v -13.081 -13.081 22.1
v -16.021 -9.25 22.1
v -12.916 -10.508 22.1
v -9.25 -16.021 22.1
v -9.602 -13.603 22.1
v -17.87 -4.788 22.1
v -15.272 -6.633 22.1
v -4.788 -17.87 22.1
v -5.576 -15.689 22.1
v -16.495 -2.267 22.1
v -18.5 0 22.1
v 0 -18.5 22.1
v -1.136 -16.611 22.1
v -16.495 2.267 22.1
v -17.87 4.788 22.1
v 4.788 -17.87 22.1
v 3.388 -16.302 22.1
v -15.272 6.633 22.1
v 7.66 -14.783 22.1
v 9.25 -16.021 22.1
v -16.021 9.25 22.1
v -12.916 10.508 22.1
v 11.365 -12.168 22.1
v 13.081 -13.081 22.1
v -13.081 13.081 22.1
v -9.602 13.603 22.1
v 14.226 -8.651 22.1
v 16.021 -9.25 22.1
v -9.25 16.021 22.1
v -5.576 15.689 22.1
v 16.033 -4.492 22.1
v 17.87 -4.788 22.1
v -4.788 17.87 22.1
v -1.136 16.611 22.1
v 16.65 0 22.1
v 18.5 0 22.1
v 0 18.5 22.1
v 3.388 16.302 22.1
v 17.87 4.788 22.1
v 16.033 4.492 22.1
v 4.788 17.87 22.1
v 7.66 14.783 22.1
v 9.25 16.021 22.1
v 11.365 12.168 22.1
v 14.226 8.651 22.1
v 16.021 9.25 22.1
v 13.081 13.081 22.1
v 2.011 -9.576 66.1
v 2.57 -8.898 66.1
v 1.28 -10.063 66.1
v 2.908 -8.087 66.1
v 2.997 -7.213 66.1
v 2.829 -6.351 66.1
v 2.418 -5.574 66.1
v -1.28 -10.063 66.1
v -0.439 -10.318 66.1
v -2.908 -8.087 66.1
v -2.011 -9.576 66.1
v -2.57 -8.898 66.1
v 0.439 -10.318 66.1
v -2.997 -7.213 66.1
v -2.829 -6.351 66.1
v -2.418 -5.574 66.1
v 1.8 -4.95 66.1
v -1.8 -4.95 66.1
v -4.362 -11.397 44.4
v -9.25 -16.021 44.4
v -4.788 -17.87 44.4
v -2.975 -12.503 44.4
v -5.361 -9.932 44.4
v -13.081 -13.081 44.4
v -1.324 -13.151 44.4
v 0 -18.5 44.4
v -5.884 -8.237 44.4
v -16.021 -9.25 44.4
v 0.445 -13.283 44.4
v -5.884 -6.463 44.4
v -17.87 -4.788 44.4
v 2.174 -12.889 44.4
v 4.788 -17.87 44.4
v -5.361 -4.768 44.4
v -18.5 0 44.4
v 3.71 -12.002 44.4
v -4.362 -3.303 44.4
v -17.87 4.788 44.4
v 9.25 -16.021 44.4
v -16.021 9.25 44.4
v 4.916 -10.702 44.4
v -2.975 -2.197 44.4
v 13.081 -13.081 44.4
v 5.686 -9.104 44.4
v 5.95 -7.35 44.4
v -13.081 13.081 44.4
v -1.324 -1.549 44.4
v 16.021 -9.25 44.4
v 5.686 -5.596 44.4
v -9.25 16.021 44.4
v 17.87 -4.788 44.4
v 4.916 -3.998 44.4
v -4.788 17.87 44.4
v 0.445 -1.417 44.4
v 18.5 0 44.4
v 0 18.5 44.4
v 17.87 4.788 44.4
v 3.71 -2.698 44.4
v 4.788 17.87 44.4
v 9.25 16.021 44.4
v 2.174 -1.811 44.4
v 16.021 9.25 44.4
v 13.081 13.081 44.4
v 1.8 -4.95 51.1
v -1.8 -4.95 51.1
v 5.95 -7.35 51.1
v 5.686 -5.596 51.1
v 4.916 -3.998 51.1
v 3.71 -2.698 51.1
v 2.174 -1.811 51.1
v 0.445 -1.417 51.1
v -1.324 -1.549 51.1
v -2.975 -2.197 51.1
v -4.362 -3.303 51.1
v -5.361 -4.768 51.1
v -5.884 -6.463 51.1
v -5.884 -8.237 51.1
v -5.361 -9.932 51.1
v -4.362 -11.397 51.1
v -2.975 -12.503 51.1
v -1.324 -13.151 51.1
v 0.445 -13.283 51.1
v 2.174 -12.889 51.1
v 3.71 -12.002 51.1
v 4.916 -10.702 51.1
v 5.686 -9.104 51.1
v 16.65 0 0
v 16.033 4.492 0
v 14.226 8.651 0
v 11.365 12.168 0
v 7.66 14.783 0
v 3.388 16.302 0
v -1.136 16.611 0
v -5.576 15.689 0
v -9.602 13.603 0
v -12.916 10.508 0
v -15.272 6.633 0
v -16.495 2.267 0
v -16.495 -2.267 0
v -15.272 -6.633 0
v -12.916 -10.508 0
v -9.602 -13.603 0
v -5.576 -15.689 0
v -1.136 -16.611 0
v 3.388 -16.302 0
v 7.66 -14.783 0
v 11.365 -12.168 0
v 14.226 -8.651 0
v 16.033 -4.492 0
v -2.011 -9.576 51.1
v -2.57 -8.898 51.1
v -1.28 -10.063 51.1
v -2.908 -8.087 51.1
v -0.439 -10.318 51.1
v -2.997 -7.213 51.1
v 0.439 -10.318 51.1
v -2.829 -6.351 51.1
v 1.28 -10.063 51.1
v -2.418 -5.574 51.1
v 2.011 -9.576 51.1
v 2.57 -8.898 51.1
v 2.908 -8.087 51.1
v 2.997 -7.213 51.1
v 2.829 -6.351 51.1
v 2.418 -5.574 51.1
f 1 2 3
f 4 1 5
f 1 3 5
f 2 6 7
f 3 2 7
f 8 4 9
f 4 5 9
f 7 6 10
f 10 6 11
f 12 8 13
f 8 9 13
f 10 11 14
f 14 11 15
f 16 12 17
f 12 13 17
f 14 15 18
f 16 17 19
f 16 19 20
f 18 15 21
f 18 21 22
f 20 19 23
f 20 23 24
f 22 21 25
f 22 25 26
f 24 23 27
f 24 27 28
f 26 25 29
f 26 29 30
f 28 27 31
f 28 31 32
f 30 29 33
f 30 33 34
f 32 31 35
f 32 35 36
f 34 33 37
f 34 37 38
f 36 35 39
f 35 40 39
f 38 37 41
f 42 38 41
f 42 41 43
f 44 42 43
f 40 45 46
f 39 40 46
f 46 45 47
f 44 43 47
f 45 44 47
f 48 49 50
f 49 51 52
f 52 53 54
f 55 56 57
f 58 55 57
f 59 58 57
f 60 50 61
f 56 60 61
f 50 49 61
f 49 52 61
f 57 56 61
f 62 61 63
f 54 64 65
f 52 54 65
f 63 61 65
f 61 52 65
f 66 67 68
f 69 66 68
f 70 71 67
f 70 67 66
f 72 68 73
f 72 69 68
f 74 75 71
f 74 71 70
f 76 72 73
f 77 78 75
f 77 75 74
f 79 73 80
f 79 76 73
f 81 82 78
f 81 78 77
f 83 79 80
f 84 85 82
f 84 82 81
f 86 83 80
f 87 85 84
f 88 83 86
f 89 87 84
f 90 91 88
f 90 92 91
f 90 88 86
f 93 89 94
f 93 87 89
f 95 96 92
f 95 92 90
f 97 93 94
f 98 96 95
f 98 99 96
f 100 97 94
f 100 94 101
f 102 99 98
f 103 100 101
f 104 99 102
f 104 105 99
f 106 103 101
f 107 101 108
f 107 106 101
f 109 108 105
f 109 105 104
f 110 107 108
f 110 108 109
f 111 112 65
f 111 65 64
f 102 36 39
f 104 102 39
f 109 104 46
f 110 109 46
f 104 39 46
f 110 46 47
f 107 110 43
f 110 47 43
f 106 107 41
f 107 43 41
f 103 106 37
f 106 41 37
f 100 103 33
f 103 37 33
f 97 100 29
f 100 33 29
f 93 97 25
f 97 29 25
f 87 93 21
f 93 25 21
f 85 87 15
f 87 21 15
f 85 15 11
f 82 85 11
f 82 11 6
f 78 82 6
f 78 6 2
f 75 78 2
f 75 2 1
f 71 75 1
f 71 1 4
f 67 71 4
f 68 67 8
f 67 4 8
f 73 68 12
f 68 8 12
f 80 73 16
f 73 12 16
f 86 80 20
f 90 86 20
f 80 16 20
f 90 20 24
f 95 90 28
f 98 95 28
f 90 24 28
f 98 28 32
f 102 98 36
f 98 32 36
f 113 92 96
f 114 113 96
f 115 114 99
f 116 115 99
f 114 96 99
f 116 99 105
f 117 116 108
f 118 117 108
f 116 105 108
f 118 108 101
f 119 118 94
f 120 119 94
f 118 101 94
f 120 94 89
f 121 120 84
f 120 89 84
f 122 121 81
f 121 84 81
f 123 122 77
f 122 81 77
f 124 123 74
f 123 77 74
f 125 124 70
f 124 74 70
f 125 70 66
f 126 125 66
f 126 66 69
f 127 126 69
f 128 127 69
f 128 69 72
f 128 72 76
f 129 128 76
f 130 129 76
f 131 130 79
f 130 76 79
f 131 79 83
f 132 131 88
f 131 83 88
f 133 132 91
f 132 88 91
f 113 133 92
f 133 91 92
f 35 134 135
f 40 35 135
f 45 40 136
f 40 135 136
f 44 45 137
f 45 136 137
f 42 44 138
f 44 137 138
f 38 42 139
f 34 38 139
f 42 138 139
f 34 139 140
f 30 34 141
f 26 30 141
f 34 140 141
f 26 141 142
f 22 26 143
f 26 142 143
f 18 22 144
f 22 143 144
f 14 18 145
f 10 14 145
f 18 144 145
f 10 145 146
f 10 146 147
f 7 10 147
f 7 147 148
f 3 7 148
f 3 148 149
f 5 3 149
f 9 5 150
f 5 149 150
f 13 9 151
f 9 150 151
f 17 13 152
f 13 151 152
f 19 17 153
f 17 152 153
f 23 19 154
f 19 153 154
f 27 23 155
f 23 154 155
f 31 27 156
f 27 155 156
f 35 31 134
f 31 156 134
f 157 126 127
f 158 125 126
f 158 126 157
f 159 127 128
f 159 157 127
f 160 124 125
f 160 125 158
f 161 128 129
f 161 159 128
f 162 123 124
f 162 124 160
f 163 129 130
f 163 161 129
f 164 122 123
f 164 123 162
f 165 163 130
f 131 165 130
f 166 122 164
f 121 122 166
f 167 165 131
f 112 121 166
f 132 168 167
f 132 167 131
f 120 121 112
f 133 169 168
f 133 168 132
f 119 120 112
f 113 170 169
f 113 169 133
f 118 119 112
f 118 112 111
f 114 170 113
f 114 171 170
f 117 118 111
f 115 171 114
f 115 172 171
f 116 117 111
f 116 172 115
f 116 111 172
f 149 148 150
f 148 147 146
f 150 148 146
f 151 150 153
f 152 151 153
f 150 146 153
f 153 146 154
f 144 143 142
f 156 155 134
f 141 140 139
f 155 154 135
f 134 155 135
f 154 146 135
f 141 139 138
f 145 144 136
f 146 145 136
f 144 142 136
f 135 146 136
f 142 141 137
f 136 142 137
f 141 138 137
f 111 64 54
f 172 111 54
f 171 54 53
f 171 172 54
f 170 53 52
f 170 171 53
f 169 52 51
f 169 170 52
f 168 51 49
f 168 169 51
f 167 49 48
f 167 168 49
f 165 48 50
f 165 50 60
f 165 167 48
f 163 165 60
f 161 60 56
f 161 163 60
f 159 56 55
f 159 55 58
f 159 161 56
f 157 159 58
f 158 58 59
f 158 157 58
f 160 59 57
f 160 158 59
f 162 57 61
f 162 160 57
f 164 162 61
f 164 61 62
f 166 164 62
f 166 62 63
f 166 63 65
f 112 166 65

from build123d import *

# Parameters (mm, degrees)
CROQUIS1_R              = 16.65
SALIENTE_EXTRUIR1_DEPTH = 22.1
CROQUIS2_R              = 18.5
SALIENTE_EXTRUIR3_DEPTH = 22.3
CROQUIS3_R              = 5.95
SALIENTE_EXTRUIR4_DEPTH = 6.7
SALIENTE_EXTRUIR5_DEPTH = 15


with BuildPart() as part:
    # Croquis1 → Saliente-Extruir1 (new body)
    with BuildSketch(Plane.XY):
        Circle(CROQUIS1_R)
    extrude(amount=SALIENTE_EXTRUIR1_DEPTH)

    # Croquis2 → Saliente-Extruir3 (add)
    with BuildSketch(Plane.XY.offset(22.1)):
        Circle(CROQUIS2_R)
    extrude(amount=SALIENTE_EXTRUIR3_DEPTH)

    # Croquis3 → Saliente-Extruir4 (add)
    with BuildSketch(Plane.XY.offset(44.4)):
        with Locations((0, -7.35)):
            Circle(CROQUIS3_R)
    extrude(amount=SALIENTE_EXTRUIR4_DEPTH)

    # Croquis4 → Saliente-Extruir5 (add)
    with BuildSketch(Plane.XY.offset(51.1)):
        with BuildLine():
            Line((-1.8, -4.95), (1.8, -4.95))
            ThreePointArc((1.8, -4.95), (0, -10.35), (-1.8, -4.95))
        make_face()
    extrude(amount=SALIENTE_EXTRUIR5_DEPTH)


solid = part.part
